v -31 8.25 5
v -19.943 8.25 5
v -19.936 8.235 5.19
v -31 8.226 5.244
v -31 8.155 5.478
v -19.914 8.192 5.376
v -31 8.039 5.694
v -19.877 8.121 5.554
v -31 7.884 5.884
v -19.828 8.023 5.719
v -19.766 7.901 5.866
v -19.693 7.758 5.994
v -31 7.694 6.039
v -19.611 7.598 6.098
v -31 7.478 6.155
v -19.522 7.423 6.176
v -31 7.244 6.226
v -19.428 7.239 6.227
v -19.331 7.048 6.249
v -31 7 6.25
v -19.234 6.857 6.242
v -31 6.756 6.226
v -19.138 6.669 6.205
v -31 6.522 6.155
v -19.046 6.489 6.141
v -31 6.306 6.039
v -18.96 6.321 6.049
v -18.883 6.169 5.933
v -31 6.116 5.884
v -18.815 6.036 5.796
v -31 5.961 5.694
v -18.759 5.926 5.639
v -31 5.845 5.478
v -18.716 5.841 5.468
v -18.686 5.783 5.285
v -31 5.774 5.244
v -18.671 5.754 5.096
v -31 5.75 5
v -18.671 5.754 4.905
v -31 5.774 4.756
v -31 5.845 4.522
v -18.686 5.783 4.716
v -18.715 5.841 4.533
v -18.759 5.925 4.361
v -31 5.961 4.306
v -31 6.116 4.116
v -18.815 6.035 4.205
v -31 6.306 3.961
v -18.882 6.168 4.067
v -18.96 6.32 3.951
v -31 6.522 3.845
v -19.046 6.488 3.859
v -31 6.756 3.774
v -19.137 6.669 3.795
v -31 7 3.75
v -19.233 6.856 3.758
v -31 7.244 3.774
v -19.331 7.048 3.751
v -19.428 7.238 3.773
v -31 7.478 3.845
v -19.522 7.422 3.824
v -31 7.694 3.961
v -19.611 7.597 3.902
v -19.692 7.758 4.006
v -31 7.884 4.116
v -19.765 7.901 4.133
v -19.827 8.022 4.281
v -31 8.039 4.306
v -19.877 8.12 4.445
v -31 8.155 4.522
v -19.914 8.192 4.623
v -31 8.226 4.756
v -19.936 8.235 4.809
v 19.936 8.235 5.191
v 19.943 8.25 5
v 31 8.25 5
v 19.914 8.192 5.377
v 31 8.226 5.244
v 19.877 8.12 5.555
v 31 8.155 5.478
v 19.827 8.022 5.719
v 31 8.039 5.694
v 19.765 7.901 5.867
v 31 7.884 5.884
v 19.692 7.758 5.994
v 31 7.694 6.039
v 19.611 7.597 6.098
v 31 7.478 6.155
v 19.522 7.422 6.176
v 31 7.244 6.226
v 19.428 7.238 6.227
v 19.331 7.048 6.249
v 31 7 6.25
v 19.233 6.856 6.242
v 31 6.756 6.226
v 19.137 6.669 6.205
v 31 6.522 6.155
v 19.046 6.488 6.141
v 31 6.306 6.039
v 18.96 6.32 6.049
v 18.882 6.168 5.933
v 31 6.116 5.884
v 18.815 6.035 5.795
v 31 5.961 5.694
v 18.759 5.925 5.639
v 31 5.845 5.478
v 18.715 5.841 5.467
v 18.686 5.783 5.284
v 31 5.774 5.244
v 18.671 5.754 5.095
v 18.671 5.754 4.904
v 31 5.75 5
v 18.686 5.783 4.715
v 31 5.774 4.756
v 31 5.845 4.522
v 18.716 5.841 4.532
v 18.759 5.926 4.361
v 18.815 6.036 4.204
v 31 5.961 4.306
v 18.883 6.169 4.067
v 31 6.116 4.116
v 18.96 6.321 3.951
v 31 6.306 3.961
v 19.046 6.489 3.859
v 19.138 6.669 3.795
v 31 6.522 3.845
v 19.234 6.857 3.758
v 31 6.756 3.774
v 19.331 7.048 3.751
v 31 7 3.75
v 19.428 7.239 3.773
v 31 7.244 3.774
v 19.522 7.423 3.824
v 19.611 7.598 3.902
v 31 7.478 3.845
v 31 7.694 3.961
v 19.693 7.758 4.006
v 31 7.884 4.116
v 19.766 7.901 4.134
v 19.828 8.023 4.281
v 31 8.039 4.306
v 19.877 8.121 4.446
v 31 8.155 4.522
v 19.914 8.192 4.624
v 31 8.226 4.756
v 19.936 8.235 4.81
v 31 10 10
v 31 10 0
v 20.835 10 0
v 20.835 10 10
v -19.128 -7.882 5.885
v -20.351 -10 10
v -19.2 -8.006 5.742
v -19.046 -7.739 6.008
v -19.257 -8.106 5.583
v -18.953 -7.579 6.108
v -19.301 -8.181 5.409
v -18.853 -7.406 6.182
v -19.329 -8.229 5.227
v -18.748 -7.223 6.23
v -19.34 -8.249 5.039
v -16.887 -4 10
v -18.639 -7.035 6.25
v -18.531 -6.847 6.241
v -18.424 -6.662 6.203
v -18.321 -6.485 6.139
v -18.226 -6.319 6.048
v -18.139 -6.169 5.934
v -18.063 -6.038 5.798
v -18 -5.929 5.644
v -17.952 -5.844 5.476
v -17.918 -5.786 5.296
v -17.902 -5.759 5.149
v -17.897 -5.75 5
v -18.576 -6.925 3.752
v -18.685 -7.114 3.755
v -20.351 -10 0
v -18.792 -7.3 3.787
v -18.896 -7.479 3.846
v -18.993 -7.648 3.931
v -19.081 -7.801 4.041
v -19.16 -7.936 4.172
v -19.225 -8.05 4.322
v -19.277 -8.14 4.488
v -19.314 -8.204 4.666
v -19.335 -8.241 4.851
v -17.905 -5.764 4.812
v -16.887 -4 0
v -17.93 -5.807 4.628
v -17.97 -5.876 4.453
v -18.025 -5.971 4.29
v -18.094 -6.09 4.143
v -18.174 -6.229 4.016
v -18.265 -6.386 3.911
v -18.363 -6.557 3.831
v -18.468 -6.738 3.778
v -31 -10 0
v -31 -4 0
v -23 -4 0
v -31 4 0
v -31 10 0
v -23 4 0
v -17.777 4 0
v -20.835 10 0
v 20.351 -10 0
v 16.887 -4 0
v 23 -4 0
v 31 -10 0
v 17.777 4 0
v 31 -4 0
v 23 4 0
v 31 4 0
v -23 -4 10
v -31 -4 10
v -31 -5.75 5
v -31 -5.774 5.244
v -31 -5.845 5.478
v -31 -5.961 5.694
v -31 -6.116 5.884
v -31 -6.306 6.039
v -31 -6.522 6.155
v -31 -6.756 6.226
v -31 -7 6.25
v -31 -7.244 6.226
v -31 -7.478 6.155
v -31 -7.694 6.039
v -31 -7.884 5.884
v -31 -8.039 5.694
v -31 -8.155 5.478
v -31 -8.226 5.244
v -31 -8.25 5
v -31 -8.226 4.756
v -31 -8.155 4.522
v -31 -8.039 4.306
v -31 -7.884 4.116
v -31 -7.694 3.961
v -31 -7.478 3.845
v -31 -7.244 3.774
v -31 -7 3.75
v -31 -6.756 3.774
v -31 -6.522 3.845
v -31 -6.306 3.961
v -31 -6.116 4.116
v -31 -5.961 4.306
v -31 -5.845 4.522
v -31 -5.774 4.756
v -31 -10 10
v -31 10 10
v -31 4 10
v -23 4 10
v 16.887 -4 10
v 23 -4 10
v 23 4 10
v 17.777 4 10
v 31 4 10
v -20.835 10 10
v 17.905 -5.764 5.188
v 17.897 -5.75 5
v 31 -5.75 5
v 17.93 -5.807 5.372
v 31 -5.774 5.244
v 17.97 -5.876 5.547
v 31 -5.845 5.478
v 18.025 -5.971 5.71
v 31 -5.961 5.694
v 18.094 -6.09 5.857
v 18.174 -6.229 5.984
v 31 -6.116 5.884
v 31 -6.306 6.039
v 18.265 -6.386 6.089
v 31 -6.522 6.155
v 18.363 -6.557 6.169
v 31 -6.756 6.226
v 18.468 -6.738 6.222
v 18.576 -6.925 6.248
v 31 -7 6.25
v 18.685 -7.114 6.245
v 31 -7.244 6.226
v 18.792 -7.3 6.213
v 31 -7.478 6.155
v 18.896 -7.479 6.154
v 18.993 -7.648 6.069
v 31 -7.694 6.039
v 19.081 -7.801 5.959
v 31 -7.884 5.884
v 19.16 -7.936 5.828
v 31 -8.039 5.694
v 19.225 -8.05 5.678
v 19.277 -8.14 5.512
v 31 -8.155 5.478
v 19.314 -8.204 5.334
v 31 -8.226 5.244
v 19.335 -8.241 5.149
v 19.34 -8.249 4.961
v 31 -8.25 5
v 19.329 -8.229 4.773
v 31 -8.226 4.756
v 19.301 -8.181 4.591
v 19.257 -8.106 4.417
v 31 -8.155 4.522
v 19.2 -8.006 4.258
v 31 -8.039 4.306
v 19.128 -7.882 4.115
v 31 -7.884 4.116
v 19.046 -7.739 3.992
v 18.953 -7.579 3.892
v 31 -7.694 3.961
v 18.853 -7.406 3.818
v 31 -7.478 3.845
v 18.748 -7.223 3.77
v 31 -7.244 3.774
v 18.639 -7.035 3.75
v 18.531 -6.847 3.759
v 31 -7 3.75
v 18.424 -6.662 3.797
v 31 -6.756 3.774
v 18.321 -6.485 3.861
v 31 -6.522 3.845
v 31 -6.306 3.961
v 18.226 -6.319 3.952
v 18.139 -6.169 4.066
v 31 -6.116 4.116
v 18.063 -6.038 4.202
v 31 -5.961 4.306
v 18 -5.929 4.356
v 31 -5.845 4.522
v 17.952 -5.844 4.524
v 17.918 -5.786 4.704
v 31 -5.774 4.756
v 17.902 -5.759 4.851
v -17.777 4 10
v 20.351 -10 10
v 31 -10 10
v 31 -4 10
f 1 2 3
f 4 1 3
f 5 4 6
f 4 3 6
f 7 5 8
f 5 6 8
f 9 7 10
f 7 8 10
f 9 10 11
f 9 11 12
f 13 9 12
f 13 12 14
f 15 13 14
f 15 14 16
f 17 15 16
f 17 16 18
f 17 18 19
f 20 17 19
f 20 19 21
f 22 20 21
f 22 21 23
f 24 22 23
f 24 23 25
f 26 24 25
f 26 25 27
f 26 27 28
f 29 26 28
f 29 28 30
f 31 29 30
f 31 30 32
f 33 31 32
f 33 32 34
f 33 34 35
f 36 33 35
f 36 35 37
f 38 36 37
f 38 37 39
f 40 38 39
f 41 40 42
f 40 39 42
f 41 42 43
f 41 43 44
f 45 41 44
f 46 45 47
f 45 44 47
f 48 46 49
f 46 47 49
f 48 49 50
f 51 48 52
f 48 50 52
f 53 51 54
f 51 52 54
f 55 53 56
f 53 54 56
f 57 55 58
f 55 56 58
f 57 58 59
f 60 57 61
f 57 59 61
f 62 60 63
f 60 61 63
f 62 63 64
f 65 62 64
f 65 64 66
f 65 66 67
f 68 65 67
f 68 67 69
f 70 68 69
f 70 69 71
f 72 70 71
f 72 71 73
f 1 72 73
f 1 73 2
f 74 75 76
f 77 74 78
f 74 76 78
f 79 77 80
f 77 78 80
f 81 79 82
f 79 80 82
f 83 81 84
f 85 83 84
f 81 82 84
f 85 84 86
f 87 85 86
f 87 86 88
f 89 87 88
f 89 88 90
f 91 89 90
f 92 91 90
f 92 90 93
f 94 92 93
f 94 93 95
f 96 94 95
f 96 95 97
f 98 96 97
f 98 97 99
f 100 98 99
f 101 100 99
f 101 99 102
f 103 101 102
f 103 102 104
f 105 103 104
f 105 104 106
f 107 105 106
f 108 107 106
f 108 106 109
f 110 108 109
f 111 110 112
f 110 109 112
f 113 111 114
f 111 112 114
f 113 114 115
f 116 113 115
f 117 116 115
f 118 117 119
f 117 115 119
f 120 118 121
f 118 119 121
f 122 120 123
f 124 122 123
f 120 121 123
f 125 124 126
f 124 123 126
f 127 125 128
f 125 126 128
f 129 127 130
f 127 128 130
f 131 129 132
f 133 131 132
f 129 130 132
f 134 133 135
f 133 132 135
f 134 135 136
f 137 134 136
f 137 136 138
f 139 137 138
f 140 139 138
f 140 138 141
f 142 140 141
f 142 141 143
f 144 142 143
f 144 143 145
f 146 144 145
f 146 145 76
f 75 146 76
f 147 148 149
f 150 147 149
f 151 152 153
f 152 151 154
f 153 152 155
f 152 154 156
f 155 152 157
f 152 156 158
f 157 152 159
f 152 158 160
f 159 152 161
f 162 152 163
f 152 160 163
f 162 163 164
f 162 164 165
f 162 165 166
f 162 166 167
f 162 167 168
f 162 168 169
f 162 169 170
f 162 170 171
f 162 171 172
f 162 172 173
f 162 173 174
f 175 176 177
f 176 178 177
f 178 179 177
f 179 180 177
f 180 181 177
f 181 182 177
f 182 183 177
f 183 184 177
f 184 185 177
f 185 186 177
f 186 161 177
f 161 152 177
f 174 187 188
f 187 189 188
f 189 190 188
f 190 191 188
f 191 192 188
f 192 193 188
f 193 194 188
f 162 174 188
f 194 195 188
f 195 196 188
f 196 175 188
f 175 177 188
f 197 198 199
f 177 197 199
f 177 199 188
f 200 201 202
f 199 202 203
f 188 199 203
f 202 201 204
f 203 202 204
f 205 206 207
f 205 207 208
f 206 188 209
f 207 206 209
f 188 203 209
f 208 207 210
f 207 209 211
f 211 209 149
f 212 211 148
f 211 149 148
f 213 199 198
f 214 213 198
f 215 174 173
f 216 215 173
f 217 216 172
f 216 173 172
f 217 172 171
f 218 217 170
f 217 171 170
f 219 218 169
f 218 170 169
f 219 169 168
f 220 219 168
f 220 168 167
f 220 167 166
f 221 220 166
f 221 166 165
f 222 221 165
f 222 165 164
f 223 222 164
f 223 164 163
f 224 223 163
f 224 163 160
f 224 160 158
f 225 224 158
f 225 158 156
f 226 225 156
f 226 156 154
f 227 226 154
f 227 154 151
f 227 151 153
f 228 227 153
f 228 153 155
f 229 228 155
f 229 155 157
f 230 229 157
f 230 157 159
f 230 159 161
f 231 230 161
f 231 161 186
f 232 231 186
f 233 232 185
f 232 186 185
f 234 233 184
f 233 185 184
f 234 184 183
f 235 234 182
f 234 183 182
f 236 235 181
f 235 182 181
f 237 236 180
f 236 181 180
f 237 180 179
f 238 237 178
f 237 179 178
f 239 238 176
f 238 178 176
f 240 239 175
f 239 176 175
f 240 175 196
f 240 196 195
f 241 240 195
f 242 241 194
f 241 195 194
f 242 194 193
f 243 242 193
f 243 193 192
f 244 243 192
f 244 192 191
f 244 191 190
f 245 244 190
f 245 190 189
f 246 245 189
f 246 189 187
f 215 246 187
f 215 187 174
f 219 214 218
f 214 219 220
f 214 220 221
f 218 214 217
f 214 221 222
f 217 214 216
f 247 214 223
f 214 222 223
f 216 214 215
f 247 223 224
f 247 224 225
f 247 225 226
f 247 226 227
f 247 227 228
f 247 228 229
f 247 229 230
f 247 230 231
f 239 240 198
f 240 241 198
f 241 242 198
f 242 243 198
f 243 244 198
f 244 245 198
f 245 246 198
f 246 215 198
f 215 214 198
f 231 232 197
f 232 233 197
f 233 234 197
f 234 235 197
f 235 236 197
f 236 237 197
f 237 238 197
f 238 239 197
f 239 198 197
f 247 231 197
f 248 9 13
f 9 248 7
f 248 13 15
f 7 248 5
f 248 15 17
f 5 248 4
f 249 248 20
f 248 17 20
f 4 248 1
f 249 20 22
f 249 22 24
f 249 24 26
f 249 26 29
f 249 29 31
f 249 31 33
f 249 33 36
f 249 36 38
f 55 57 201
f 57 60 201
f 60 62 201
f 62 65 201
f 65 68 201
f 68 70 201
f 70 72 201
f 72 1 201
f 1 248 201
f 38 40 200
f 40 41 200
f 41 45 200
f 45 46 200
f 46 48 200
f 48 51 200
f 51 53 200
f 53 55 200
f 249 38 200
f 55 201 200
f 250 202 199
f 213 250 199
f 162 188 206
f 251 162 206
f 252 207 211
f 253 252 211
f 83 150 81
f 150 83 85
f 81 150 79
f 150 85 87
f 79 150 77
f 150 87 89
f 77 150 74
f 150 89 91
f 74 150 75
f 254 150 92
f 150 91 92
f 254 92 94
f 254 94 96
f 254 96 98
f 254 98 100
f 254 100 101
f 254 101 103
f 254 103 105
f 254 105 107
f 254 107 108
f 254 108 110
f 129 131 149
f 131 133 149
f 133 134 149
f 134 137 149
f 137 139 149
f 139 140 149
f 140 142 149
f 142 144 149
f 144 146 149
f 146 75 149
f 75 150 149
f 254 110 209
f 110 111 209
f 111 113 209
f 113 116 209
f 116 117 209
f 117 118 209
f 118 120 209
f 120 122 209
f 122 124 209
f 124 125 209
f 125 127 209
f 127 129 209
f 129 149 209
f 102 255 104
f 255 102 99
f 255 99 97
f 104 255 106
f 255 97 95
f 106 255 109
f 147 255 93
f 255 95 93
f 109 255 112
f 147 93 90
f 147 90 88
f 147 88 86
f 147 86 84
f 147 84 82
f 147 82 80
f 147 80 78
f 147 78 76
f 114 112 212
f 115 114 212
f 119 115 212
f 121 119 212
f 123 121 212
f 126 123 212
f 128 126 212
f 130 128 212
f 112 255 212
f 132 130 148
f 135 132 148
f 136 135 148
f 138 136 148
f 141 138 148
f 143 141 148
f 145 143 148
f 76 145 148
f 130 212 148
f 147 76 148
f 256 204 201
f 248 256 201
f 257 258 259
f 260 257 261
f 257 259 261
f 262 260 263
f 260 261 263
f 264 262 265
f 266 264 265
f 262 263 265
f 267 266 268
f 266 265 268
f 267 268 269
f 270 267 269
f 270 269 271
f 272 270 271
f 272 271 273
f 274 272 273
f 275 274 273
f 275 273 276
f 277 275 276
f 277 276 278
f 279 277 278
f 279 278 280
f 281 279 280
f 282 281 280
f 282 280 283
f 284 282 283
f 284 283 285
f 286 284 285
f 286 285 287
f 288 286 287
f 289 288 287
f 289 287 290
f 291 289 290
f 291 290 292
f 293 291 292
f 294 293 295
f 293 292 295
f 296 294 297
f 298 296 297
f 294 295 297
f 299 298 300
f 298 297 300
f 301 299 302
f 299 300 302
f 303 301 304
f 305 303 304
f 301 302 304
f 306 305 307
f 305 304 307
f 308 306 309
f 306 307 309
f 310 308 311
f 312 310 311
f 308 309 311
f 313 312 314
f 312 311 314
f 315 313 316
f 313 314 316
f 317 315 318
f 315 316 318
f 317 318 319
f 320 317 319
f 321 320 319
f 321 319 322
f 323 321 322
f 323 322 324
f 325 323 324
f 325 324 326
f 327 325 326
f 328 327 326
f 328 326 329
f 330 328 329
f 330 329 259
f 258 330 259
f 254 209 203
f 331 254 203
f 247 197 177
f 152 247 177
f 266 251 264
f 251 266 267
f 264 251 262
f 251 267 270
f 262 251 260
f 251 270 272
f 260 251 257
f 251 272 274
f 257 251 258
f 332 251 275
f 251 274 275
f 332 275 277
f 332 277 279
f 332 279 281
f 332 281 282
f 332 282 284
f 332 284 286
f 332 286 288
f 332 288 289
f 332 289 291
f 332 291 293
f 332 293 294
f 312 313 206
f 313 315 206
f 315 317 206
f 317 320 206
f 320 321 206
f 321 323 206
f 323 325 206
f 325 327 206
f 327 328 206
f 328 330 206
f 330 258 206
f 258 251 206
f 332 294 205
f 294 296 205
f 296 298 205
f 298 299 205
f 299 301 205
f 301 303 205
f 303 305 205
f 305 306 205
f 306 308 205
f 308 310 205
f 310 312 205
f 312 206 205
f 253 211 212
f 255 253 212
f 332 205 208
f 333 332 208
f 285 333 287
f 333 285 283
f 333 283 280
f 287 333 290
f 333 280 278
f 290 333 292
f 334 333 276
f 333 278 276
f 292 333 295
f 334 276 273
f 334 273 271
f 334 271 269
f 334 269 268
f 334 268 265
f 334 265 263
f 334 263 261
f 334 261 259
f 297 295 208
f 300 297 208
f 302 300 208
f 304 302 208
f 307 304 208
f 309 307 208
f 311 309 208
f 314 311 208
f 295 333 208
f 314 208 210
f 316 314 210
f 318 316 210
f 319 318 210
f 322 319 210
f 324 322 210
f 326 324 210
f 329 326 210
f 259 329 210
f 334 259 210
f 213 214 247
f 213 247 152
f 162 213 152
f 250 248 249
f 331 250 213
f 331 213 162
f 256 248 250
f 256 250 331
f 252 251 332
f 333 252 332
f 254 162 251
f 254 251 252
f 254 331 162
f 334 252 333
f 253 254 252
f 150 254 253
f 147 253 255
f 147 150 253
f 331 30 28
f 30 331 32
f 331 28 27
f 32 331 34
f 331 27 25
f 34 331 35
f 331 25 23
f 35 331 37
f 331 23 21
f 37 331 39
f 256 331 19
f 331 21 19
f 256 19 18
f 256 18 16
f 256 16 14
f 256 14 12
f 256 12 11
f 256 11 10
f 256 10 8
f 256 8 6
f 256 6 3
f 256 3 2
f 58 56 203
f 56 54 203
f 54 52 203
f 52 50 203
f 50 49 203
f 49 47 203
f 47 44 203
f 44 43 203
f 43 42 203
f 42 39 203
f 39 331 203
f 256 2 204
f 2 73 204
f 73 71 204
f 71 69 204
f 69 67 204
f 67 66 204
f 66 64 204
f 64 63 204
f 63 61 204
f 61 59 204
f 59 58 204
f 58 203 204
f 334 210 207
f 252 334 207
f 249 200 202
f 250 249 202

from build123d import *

# Parameters (mm, degrees)
F1_DEPTH = 10
F2_R     = 1.25
F3_DEPTH = 62.001


with BuildPart() as f1:
    # F0 (on Top) → F1 (new body)
    with BuildSketch(Plane.XY):
        Polygon((31, 4), (31, 10), (20.835134, 10), (17.777494, 4), (0, 4), (-17.777494, 4), (-20.835134, 10), (-31, 10), (-31, 4), (-23, 4), (-23, -4), (-31, -4), (-31, -10), (-20.350992, -10), (-16.88689, -4), (0, -4), (16.88689, -4), (20.350992, -10), (31, -10), (31, -4), (23, -4), (23, 4), align=None)
    extrude(amount=F1_DEPTH)

    # F2 (on face) → F3 (cut, through all)
    with BuildSketch(Plane.YZ.offset(31)):
        with Locations((-7, 5)):
            Circle(F2_R)
        with Locations((7, 5)):
            Circle(F2_R)
    extrude(amount=-F3_DEPTH, mode=Mode.SUBTRACT)


solid = f1.part
